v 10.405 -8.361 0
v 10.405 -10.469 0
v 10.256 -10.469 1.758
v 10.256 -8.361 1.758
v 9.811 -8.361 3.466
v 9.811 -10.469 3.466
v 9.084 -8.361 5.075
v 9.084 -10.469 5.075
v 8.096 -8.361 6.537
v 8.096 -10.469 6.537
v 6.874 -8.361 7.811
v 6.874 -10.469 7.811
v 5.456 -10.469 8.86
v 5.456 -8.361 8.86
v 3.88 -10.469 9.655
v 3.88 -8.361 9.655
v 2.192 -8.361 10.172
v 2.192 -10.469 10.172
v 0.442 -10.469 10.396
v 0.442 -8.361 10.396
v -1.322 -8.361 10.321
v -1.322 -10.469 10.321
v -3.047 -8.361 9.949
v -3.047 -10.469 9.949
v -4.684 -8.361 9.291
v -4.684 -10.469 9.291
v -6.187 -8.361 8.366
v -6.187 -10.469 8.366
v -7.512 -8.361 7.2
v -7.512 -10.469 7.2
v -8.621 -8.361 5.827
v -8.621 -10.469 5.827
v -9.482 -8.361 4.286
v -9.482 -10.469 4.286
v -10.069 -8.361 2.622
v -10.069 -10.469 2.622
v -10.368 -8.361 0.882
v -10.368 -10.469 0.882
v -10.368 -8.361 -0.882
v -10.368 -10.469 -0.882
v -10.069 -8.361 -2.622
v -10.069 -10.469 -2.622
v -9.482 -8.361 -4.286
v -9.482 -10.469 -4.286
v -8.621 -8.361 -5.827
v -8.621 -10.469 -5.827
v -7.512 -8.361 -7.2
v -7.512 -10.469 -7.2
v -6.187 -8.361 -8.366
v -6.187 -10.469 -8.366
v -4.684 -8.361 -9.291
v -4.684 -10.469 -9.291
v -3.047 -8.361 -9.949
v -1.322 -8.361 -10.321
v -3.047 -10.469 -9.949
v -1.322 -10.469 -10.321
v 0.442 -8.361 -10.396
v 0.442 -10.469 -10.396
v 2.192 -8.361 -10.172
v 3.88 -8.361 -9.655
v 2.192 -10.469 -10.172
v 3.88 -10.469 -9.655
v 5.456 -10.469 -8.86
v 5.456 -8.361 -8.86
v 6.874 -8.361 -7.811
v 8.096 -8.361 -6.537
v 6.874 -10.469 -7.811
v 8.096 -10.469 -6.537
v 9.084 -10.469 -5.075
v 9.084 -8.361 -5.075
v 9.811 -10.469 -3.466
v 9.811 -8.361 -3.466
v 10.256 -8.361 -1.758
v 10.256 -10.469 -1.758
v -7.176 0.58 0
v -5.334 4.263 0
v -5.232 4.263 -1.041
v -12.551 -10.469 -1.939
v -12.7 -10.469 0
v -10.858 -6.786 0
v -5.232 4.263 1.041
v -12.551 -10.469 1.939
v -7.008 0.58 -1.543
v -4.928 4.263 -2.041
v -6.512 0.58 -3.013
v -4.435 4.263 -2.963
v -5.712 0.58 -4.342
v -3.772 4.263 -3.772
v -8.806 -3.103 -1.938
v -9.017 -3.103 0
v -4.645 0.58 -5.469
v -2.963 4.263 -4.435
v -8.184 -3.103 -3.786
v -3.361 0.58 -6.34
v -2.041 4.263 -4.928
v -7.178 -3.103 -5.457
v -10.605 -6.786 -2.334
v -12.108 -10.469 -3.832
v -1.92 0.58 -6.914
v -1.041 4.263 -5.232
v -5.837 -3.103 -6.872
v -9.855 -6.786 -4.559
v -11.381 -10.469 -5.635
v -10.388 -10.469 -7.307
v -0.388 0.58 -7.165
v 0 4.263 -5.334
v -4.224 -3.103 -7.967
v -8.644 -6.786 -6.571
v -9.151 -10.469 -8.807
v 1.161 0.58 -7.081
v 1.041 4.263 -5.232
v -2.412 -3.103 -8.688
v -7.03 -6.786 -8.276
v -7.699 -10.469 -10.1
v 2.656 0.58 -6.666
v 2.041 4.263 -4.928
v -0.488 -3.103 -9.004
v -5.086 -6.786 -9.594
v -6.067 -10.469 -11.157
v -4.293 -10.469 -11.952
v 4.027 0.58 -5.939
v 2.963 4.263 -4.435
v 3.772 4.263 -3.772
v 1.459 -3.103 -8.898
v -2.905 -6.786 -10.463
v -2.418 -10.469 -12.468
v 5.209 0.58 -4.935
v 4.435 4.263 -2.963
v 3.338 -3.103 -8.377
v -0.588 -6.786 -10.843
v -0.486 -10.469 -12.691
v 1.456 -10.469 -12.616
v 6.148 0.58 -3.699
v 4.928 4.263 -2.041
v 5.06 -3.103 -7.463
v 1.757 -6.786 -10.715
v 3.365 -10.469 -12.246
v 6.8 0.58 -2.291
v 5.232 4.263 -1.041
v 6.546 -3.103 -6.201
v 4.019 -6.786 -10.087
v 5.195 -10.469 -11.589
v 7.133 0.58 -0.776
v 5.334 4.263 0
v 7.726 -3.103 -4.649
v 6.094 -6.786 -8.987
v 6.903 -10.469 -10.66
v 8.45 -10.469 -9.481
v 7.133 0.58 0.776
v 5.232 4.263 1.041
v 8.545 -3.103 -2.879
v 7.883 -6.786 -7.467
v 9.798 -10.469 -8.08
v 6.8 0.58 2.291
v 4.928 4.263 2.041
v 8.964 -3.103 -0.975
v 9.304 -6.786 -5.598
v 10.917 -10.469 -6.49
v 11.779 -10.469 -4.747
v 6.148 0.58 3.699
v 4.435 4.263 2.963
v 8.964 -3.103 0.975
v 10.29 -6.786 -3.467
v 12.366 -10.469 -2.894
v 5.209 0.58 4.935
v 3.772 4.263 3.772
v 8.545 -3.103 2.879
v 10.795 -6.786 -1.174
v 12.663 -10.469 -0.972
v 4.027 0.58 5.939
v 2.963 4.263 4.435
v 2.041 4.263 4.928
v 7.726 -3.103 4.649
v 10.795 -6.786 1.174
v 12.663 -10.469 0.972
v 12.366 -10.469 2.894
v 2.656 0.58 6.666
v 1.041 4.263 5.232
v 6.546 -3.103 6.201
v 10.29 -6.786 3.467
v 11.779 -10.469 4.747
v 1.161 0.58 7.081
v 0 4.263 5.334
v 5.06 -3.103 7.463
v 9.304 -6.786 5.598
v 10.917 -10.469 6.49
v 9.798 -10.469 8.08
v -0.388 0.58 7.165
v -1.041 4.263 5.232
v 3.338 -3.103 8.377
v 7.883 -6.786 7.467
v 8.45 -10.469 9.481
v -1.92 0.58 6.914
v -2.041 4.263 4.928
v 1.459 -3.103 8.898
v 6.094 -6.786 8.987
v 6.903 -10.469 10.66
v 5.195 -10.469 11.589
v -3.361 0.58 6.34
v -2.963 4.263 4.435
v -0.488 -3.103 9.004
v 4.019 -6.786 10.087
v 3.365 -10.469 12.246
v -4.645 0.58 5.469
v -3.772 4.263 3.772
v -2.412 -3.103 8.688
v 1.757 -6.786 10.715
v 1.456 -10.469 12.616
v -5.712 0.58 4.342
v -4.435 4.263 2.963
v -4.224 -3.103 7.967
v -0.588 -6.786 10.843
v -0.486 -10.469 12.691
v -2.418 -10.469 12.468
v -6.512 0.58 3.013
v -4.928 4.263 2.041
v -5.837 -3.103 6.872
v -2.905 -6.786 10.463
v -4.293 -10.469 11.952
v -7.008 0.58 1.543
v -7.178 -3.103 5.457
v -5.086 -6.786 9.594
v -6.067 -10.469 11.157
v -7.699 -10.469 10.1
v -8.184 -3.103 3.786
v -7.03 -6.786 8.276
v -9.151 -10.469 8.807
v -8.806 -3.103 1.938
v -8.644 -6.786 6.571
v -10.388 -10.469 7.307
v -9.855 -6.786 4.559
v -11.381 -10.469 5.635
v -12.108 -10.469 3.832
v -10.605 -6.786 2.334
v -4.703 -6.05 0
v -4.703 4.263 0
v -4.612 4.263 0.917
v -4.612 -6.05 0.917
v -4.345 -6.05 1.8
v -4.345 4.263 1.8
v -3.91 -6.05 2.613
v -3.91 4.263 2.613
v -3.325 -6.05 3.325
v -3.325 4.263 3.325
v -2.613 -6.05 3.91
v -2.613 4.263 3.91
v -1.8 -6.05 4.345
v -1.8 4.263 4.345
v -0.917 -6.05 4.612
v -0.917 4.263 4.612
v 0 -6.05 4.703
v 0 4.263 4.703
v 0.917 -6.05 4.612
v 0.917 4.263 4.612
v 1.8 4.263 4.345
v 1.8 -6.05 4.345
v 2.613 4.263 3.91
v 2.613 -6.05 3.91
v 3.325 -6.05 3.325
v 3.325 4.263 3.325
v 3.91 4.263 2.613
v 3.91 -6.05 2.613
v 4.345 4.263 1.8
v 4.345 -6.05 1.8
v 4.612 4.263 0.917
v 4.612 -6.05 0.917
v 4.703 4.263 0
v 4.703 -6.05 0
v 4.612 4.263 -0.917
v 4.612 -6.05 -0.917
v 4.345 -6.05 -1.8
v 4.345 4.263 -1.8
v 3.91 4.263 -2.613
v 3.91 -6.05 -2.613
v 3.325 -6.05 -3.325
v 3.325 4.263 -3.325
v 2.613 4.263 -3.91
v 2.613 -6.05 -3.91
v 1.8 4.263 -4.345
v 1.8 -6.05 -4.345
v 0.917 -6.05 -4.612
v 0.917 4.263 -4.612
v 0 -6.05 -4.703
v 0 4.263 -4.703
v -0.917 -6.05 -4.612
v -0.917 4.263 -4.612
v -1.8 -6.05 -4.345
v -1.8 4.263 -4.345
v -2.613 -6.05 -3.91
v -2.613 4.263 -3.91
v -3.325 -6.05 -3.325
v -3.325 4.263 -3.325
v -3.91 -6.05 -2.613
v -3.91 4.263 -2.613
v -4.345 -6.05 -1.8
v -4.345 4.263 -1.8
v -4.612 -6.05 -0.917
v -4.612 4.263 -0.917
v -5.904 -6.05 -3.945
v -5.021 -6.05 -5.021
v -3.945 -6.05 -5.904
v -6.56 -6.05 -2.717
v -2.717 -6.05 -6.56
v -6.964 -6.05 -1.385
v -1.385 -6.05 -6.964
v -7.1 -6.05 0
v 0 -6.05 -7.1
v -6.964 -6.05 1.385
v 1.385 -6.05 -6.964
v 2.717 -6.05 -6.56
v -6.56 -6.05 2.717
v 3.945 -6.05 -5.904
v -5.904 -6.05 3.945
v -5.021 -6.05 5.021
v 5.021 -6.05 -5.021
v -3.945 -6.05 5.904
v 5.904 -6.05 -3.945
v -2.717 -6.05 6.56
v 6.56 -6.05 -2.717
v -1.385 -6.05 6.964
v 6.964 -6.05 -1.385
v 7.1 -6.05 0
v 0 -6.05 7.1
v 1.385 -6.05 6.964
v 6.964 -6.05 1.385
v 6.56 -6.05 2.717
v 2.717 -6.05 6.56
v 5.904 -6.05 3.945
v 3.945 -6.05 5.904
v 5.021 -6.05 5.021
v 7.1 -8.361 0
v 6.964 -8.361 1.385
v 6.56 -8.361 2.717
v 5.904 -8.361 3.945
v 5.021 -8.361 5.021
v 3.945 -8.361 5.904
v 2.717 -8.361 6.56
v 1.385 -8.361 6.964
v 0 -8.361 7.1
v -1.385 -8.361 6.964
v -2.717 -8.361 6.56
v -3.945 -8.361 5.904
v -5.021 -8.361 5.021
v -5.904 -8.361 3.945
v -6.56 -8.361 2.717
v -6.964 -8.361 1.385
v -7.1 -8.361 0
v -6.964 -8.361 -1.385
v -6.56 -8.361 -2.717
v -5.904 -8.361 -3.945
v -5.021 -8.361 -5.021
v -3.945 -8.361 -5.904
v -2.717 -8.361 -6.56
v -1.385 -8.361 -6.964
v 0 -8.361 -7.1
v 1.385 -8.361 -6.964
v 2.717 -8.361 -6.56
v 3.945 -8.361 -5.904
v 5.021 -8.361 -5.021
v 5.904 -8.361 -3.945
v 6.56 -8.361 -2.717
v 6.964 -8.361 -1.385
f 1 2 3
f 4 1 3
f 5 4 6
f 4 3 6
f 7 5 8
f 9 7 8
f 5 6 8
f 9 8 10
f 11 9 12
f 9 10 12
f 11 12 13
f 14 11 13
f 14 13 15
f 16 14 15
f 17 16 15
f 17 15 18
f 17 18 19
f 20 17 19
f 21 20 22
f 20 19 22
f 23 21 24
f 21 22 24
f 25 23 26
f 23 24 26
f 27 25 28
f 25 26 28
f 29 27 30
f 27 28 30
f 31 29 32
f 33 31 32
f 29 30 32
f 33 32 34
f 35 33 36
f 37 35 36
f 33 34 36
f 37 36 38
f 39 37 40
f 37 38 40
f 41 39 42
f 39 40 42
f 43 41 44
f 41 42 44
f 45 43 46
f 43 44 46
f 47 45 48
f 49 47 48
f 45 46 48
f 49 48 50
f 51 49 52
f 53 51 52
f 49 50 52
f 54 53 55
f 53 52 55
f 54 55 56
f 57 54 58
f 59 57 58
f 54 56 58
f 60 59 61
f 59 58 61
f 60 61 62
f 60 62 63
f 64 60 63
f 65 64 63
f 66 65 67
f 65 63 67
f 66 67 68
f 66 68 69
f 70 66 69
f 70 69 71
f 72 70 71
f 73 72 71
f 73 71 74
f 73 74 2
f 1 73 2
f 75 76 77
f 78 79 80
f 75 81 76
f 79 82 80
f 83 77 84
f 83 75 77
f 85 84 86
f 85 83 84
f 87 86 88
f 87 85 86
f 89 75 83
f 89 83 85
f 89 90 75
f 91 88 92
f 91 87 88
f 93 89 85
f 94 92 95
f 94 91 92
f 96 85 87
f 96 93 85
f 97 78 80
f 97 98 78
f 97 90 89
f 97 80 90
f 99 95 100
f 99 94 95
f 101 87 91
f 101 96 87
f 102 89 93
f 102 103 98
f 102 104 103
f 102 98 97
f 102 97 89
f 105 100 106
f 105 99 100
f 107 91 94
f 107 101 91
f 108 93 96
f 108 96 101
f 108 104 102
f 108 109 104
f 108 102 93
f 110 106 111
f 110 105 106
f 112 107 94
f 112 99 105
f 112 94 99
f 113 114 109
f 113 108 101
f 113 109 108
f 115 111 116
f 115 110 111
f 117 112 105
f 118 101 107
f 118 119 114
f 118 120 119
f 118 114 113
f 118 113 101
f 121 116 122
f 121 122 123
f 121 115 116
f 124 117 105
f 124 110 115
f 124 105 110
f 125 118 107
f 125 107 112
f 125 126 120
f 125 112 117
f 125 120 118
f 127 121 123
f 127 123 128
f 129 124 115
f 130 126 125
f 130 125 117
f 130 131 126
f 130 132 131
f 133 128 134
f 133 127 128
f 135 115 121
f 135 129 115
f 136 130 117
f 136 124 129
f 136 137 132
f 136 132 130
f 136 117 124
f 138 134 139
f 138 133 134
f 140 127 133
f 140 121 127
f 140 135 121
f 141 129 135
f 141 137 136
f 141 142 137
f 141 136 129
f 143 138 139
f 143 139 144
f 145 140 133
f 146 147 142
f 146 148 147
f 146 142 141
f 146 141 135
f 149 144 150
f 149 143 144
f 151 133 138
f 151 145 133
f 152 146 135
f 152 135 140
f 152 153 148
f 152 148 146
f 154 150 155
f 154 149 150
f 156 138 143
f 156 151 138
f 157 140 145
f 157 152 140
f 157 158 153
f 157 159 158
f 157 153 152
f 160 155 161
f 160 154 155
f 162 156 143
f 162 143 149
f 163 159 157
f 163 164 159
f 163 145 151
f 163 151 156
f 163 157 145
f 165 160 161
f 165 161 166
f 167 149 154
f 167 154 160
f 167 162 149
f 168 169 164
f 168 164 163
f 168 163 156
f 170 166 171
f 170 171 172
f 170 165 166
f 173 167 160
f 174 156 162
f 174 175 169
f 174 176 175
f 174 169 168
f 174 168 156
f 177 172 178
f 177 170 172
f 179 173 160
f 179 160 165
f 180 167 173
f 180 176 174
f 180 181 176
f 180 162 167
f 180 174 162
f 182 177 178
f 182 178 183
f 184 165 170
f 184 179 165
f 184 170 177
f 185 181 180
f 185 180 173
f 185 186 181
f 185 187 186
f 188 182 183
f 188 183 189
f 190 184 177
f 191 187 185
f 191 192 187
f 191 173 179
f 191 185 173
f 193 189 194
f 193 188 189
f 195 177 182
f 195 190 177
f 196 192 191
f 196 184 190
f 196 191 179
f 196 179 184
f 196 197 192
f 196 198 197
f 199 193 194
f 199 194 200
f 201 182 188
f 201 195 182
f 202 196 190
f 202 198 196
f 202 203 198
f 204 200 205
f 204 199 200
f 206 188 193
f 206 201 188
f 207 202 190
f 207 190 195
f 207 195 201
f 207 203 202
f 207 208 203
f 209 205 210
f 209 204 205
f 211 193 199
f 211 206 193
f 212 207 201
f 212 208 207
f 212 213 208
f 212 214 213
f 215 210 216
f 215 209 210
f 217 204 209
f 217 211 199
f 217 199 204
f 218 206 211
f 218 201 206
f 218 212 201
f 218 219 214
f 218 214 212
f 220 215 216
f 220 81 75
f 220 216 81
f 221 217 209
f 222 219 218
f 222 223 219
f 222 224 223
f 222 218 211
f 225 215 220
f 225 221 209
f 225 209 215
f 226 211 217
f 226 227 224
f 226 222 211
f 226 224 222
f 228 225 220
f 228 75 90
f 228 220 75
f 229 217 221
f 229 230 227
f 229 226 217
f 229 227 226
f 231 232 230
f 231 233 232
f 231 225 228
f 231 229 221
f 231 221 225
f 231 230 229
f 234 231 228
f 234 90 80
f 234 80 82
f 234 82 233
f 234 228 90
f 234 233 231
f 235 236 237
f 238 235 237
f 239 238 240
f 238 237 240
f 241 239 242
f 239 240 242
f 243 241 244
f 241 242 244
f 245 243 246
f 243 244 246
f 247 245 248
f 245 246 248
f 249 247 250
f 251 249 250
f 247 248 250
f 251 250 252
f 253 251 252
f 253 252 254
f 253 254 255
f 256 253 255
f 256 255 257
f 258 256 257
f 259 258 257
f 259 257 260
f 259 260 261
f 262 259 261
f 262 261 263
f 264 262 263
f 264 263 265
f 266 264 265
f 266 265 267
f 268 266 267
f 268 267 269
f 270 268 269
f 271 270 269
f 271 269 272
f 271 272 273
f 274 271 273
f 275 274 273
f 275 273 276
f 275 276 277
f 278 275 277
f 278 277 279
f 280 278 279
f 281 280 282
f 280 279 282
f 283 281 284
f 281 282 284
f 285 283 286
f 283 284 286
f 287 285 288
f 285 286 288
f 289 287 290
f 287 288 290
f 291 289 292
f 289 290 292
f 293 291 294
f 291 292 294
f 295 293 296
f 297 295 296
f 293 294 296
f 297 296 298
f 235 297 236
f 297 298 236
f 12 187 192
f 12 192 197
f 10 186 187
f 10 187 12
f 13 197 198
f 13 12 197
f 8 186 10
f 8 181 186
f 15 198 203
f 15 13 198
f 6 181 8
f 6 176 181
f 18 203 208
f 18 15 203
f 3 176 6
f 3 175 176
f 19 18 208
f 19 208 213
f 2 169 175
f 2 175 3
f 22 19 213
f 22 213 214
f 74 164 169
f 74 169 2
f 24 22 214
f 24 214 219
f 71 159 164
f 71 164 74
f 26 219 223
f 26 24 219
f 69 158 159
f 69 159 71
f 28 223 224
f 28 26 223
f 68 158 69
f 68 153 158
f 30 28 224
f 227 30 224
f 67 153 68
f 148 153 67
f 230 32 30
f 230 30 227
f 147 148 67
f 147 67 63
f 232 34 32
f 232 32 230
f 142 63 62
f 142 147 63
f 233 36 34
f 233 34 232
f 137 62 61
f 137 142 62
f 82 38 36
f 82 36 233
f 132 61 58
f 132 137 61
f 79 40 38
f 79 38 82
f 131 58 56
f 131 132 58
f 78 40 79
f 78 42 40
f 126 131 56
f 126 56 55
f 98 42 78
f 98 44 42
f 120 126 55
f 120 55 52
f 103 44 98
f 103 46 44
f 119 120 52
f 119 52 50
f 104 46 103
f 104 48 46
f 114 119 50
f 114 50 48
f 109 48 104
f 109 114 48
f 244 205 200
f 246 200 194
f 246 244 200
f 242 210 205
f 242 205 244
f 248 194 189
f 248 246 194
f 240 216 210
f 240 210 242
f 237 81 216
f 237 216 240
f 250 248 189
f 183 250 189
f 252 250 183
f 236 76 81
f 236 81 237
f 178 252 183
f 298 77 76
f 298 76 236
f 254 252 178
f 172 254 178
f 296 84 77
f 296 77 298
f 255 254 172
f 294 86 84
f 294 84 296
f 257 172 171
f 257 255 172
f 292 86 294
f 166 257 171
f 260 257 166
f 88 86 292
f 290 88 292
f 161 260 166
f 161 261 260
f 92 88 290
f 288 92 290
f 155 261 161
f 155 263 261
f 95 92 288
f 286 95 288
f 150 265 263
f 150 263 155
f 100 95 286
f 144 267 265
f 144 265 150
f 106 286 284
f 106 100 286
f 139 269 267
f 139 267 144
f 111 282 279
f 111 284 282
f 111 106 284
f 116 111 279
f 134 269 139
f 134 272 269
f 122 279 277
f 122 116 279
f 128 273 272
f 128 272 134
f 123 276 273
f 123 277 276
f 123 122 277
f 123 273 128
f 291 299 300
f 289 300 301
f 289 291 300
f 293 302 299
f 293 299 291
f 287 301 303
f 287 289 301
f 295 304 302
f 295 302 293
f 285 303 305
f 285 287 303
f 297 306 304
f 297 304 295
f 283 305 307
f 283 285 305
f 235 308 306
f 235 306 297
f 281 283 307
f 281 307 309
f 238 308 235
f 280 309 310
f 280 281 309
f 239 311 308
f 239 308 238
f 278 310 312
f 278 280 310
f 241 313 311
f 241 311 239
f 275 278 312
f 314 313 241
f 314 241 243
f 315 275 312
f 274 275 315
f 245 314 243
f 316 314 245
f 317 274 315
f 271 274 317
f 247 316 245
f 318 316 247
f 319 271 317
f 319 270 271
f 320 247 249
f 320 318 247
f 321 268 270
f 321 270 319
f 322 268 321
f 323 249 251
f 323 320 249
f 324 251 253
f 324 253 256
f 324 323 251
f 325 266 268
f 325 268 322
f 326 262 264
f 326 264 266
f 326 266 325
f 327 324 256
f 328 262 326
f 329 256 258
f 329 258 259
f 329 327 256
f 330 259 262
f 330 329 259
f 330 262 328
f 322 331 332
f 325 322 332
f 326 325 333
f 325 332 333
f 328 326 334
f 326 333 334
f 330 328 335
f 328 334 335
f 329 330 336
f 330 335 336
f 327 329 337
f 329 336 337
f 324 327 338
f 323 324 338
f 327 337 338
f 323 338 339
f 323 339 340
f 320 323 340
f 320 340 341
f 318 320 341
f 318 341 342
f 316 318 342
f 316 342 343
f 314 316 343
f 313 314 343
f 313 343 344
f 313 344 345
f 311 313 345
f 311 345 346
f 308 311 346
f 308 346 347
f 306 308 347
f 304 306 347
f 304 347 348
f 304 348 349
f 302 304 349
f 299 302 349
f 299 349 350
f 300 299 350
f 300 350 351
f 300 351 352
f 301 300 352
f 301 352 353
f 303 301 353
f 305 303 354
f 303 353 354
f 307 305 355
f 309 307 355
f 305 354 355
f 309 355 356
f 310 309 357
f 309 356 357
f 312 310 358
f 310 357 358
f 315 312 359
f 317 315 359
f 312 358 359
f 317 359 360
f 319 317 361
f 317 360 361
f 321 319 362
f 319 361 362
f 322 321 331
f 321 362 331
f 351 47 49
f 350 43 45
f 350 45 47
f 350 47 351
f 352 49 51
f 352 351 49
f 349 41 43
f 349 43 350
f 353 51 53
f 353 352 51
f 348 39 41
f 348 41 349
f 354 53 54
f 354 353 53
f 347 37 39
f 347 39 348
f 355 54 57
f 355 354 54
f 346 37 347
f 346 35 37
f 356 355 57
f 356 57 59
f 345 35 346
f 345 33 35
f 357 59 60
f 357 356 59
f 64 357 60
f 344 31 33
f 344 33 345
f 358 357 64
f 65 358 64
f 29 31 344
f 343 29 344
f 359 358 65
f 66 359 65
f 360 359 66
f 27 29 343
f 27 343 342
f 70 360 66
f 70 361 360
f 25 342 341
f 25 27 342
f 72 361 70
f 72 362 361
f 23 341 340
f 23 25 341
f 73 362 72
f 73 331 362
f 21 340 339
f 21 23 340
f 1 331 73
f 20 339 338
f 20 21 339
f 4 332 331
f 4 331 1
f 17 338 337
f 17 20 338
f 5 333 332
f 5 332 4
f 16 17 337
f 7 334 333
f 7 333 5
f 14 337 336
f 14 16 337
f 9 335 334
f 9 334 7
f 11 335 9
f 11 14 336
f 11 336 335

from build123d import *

# Parameters (mm, degrees)
F2_R     = 4.702761
F3_DEPTH = 25.4
F5_R     = 7.100164
F6_DEPTH = 4.4196
F7_R     = 10.405199
F8_DEPTH = 2.1082


with BuildPart() as f1:
    # F0 (on Top) → F1 (revolve)
    with BuildSketch(Plane.XY):
        Polygon((0, -10.469328), (0, 4.262672), (-5.334, 4.262672), (-12.7, -10.469328), align=None)
    revolve(axis=Axis((0, 2.230672, 0), (0, -1, 0)))

    # F2 (on face) → F3 (cut)
    with BuildSketch(Plane(origin=(0, 4.262672, 0), x_dir=(-1, 0, 0), z_dir=(0, 1, 0))):
        Circle(F2_R)
    extrude(amount=-F3_DEPTH, mode=Mode.SUBTRACT)

    # F5 (on face) → F6 (cut)
    with BuildSketch(Plane.XZ.offset(10.469328)):
        Circle(F5_R)
    extrude(amount=-F6_DEPTH, mode=Mode.SUBTRACT)

    # F7 (on face) → F8 (cut)
    with BuildSketch(Plane.XZ.offset(10.469328)):
        Circle(F7_R)
    extrude(amount=-F8_DEPTH, mode=Mode.SUBTRACT)


solid = f1.part
